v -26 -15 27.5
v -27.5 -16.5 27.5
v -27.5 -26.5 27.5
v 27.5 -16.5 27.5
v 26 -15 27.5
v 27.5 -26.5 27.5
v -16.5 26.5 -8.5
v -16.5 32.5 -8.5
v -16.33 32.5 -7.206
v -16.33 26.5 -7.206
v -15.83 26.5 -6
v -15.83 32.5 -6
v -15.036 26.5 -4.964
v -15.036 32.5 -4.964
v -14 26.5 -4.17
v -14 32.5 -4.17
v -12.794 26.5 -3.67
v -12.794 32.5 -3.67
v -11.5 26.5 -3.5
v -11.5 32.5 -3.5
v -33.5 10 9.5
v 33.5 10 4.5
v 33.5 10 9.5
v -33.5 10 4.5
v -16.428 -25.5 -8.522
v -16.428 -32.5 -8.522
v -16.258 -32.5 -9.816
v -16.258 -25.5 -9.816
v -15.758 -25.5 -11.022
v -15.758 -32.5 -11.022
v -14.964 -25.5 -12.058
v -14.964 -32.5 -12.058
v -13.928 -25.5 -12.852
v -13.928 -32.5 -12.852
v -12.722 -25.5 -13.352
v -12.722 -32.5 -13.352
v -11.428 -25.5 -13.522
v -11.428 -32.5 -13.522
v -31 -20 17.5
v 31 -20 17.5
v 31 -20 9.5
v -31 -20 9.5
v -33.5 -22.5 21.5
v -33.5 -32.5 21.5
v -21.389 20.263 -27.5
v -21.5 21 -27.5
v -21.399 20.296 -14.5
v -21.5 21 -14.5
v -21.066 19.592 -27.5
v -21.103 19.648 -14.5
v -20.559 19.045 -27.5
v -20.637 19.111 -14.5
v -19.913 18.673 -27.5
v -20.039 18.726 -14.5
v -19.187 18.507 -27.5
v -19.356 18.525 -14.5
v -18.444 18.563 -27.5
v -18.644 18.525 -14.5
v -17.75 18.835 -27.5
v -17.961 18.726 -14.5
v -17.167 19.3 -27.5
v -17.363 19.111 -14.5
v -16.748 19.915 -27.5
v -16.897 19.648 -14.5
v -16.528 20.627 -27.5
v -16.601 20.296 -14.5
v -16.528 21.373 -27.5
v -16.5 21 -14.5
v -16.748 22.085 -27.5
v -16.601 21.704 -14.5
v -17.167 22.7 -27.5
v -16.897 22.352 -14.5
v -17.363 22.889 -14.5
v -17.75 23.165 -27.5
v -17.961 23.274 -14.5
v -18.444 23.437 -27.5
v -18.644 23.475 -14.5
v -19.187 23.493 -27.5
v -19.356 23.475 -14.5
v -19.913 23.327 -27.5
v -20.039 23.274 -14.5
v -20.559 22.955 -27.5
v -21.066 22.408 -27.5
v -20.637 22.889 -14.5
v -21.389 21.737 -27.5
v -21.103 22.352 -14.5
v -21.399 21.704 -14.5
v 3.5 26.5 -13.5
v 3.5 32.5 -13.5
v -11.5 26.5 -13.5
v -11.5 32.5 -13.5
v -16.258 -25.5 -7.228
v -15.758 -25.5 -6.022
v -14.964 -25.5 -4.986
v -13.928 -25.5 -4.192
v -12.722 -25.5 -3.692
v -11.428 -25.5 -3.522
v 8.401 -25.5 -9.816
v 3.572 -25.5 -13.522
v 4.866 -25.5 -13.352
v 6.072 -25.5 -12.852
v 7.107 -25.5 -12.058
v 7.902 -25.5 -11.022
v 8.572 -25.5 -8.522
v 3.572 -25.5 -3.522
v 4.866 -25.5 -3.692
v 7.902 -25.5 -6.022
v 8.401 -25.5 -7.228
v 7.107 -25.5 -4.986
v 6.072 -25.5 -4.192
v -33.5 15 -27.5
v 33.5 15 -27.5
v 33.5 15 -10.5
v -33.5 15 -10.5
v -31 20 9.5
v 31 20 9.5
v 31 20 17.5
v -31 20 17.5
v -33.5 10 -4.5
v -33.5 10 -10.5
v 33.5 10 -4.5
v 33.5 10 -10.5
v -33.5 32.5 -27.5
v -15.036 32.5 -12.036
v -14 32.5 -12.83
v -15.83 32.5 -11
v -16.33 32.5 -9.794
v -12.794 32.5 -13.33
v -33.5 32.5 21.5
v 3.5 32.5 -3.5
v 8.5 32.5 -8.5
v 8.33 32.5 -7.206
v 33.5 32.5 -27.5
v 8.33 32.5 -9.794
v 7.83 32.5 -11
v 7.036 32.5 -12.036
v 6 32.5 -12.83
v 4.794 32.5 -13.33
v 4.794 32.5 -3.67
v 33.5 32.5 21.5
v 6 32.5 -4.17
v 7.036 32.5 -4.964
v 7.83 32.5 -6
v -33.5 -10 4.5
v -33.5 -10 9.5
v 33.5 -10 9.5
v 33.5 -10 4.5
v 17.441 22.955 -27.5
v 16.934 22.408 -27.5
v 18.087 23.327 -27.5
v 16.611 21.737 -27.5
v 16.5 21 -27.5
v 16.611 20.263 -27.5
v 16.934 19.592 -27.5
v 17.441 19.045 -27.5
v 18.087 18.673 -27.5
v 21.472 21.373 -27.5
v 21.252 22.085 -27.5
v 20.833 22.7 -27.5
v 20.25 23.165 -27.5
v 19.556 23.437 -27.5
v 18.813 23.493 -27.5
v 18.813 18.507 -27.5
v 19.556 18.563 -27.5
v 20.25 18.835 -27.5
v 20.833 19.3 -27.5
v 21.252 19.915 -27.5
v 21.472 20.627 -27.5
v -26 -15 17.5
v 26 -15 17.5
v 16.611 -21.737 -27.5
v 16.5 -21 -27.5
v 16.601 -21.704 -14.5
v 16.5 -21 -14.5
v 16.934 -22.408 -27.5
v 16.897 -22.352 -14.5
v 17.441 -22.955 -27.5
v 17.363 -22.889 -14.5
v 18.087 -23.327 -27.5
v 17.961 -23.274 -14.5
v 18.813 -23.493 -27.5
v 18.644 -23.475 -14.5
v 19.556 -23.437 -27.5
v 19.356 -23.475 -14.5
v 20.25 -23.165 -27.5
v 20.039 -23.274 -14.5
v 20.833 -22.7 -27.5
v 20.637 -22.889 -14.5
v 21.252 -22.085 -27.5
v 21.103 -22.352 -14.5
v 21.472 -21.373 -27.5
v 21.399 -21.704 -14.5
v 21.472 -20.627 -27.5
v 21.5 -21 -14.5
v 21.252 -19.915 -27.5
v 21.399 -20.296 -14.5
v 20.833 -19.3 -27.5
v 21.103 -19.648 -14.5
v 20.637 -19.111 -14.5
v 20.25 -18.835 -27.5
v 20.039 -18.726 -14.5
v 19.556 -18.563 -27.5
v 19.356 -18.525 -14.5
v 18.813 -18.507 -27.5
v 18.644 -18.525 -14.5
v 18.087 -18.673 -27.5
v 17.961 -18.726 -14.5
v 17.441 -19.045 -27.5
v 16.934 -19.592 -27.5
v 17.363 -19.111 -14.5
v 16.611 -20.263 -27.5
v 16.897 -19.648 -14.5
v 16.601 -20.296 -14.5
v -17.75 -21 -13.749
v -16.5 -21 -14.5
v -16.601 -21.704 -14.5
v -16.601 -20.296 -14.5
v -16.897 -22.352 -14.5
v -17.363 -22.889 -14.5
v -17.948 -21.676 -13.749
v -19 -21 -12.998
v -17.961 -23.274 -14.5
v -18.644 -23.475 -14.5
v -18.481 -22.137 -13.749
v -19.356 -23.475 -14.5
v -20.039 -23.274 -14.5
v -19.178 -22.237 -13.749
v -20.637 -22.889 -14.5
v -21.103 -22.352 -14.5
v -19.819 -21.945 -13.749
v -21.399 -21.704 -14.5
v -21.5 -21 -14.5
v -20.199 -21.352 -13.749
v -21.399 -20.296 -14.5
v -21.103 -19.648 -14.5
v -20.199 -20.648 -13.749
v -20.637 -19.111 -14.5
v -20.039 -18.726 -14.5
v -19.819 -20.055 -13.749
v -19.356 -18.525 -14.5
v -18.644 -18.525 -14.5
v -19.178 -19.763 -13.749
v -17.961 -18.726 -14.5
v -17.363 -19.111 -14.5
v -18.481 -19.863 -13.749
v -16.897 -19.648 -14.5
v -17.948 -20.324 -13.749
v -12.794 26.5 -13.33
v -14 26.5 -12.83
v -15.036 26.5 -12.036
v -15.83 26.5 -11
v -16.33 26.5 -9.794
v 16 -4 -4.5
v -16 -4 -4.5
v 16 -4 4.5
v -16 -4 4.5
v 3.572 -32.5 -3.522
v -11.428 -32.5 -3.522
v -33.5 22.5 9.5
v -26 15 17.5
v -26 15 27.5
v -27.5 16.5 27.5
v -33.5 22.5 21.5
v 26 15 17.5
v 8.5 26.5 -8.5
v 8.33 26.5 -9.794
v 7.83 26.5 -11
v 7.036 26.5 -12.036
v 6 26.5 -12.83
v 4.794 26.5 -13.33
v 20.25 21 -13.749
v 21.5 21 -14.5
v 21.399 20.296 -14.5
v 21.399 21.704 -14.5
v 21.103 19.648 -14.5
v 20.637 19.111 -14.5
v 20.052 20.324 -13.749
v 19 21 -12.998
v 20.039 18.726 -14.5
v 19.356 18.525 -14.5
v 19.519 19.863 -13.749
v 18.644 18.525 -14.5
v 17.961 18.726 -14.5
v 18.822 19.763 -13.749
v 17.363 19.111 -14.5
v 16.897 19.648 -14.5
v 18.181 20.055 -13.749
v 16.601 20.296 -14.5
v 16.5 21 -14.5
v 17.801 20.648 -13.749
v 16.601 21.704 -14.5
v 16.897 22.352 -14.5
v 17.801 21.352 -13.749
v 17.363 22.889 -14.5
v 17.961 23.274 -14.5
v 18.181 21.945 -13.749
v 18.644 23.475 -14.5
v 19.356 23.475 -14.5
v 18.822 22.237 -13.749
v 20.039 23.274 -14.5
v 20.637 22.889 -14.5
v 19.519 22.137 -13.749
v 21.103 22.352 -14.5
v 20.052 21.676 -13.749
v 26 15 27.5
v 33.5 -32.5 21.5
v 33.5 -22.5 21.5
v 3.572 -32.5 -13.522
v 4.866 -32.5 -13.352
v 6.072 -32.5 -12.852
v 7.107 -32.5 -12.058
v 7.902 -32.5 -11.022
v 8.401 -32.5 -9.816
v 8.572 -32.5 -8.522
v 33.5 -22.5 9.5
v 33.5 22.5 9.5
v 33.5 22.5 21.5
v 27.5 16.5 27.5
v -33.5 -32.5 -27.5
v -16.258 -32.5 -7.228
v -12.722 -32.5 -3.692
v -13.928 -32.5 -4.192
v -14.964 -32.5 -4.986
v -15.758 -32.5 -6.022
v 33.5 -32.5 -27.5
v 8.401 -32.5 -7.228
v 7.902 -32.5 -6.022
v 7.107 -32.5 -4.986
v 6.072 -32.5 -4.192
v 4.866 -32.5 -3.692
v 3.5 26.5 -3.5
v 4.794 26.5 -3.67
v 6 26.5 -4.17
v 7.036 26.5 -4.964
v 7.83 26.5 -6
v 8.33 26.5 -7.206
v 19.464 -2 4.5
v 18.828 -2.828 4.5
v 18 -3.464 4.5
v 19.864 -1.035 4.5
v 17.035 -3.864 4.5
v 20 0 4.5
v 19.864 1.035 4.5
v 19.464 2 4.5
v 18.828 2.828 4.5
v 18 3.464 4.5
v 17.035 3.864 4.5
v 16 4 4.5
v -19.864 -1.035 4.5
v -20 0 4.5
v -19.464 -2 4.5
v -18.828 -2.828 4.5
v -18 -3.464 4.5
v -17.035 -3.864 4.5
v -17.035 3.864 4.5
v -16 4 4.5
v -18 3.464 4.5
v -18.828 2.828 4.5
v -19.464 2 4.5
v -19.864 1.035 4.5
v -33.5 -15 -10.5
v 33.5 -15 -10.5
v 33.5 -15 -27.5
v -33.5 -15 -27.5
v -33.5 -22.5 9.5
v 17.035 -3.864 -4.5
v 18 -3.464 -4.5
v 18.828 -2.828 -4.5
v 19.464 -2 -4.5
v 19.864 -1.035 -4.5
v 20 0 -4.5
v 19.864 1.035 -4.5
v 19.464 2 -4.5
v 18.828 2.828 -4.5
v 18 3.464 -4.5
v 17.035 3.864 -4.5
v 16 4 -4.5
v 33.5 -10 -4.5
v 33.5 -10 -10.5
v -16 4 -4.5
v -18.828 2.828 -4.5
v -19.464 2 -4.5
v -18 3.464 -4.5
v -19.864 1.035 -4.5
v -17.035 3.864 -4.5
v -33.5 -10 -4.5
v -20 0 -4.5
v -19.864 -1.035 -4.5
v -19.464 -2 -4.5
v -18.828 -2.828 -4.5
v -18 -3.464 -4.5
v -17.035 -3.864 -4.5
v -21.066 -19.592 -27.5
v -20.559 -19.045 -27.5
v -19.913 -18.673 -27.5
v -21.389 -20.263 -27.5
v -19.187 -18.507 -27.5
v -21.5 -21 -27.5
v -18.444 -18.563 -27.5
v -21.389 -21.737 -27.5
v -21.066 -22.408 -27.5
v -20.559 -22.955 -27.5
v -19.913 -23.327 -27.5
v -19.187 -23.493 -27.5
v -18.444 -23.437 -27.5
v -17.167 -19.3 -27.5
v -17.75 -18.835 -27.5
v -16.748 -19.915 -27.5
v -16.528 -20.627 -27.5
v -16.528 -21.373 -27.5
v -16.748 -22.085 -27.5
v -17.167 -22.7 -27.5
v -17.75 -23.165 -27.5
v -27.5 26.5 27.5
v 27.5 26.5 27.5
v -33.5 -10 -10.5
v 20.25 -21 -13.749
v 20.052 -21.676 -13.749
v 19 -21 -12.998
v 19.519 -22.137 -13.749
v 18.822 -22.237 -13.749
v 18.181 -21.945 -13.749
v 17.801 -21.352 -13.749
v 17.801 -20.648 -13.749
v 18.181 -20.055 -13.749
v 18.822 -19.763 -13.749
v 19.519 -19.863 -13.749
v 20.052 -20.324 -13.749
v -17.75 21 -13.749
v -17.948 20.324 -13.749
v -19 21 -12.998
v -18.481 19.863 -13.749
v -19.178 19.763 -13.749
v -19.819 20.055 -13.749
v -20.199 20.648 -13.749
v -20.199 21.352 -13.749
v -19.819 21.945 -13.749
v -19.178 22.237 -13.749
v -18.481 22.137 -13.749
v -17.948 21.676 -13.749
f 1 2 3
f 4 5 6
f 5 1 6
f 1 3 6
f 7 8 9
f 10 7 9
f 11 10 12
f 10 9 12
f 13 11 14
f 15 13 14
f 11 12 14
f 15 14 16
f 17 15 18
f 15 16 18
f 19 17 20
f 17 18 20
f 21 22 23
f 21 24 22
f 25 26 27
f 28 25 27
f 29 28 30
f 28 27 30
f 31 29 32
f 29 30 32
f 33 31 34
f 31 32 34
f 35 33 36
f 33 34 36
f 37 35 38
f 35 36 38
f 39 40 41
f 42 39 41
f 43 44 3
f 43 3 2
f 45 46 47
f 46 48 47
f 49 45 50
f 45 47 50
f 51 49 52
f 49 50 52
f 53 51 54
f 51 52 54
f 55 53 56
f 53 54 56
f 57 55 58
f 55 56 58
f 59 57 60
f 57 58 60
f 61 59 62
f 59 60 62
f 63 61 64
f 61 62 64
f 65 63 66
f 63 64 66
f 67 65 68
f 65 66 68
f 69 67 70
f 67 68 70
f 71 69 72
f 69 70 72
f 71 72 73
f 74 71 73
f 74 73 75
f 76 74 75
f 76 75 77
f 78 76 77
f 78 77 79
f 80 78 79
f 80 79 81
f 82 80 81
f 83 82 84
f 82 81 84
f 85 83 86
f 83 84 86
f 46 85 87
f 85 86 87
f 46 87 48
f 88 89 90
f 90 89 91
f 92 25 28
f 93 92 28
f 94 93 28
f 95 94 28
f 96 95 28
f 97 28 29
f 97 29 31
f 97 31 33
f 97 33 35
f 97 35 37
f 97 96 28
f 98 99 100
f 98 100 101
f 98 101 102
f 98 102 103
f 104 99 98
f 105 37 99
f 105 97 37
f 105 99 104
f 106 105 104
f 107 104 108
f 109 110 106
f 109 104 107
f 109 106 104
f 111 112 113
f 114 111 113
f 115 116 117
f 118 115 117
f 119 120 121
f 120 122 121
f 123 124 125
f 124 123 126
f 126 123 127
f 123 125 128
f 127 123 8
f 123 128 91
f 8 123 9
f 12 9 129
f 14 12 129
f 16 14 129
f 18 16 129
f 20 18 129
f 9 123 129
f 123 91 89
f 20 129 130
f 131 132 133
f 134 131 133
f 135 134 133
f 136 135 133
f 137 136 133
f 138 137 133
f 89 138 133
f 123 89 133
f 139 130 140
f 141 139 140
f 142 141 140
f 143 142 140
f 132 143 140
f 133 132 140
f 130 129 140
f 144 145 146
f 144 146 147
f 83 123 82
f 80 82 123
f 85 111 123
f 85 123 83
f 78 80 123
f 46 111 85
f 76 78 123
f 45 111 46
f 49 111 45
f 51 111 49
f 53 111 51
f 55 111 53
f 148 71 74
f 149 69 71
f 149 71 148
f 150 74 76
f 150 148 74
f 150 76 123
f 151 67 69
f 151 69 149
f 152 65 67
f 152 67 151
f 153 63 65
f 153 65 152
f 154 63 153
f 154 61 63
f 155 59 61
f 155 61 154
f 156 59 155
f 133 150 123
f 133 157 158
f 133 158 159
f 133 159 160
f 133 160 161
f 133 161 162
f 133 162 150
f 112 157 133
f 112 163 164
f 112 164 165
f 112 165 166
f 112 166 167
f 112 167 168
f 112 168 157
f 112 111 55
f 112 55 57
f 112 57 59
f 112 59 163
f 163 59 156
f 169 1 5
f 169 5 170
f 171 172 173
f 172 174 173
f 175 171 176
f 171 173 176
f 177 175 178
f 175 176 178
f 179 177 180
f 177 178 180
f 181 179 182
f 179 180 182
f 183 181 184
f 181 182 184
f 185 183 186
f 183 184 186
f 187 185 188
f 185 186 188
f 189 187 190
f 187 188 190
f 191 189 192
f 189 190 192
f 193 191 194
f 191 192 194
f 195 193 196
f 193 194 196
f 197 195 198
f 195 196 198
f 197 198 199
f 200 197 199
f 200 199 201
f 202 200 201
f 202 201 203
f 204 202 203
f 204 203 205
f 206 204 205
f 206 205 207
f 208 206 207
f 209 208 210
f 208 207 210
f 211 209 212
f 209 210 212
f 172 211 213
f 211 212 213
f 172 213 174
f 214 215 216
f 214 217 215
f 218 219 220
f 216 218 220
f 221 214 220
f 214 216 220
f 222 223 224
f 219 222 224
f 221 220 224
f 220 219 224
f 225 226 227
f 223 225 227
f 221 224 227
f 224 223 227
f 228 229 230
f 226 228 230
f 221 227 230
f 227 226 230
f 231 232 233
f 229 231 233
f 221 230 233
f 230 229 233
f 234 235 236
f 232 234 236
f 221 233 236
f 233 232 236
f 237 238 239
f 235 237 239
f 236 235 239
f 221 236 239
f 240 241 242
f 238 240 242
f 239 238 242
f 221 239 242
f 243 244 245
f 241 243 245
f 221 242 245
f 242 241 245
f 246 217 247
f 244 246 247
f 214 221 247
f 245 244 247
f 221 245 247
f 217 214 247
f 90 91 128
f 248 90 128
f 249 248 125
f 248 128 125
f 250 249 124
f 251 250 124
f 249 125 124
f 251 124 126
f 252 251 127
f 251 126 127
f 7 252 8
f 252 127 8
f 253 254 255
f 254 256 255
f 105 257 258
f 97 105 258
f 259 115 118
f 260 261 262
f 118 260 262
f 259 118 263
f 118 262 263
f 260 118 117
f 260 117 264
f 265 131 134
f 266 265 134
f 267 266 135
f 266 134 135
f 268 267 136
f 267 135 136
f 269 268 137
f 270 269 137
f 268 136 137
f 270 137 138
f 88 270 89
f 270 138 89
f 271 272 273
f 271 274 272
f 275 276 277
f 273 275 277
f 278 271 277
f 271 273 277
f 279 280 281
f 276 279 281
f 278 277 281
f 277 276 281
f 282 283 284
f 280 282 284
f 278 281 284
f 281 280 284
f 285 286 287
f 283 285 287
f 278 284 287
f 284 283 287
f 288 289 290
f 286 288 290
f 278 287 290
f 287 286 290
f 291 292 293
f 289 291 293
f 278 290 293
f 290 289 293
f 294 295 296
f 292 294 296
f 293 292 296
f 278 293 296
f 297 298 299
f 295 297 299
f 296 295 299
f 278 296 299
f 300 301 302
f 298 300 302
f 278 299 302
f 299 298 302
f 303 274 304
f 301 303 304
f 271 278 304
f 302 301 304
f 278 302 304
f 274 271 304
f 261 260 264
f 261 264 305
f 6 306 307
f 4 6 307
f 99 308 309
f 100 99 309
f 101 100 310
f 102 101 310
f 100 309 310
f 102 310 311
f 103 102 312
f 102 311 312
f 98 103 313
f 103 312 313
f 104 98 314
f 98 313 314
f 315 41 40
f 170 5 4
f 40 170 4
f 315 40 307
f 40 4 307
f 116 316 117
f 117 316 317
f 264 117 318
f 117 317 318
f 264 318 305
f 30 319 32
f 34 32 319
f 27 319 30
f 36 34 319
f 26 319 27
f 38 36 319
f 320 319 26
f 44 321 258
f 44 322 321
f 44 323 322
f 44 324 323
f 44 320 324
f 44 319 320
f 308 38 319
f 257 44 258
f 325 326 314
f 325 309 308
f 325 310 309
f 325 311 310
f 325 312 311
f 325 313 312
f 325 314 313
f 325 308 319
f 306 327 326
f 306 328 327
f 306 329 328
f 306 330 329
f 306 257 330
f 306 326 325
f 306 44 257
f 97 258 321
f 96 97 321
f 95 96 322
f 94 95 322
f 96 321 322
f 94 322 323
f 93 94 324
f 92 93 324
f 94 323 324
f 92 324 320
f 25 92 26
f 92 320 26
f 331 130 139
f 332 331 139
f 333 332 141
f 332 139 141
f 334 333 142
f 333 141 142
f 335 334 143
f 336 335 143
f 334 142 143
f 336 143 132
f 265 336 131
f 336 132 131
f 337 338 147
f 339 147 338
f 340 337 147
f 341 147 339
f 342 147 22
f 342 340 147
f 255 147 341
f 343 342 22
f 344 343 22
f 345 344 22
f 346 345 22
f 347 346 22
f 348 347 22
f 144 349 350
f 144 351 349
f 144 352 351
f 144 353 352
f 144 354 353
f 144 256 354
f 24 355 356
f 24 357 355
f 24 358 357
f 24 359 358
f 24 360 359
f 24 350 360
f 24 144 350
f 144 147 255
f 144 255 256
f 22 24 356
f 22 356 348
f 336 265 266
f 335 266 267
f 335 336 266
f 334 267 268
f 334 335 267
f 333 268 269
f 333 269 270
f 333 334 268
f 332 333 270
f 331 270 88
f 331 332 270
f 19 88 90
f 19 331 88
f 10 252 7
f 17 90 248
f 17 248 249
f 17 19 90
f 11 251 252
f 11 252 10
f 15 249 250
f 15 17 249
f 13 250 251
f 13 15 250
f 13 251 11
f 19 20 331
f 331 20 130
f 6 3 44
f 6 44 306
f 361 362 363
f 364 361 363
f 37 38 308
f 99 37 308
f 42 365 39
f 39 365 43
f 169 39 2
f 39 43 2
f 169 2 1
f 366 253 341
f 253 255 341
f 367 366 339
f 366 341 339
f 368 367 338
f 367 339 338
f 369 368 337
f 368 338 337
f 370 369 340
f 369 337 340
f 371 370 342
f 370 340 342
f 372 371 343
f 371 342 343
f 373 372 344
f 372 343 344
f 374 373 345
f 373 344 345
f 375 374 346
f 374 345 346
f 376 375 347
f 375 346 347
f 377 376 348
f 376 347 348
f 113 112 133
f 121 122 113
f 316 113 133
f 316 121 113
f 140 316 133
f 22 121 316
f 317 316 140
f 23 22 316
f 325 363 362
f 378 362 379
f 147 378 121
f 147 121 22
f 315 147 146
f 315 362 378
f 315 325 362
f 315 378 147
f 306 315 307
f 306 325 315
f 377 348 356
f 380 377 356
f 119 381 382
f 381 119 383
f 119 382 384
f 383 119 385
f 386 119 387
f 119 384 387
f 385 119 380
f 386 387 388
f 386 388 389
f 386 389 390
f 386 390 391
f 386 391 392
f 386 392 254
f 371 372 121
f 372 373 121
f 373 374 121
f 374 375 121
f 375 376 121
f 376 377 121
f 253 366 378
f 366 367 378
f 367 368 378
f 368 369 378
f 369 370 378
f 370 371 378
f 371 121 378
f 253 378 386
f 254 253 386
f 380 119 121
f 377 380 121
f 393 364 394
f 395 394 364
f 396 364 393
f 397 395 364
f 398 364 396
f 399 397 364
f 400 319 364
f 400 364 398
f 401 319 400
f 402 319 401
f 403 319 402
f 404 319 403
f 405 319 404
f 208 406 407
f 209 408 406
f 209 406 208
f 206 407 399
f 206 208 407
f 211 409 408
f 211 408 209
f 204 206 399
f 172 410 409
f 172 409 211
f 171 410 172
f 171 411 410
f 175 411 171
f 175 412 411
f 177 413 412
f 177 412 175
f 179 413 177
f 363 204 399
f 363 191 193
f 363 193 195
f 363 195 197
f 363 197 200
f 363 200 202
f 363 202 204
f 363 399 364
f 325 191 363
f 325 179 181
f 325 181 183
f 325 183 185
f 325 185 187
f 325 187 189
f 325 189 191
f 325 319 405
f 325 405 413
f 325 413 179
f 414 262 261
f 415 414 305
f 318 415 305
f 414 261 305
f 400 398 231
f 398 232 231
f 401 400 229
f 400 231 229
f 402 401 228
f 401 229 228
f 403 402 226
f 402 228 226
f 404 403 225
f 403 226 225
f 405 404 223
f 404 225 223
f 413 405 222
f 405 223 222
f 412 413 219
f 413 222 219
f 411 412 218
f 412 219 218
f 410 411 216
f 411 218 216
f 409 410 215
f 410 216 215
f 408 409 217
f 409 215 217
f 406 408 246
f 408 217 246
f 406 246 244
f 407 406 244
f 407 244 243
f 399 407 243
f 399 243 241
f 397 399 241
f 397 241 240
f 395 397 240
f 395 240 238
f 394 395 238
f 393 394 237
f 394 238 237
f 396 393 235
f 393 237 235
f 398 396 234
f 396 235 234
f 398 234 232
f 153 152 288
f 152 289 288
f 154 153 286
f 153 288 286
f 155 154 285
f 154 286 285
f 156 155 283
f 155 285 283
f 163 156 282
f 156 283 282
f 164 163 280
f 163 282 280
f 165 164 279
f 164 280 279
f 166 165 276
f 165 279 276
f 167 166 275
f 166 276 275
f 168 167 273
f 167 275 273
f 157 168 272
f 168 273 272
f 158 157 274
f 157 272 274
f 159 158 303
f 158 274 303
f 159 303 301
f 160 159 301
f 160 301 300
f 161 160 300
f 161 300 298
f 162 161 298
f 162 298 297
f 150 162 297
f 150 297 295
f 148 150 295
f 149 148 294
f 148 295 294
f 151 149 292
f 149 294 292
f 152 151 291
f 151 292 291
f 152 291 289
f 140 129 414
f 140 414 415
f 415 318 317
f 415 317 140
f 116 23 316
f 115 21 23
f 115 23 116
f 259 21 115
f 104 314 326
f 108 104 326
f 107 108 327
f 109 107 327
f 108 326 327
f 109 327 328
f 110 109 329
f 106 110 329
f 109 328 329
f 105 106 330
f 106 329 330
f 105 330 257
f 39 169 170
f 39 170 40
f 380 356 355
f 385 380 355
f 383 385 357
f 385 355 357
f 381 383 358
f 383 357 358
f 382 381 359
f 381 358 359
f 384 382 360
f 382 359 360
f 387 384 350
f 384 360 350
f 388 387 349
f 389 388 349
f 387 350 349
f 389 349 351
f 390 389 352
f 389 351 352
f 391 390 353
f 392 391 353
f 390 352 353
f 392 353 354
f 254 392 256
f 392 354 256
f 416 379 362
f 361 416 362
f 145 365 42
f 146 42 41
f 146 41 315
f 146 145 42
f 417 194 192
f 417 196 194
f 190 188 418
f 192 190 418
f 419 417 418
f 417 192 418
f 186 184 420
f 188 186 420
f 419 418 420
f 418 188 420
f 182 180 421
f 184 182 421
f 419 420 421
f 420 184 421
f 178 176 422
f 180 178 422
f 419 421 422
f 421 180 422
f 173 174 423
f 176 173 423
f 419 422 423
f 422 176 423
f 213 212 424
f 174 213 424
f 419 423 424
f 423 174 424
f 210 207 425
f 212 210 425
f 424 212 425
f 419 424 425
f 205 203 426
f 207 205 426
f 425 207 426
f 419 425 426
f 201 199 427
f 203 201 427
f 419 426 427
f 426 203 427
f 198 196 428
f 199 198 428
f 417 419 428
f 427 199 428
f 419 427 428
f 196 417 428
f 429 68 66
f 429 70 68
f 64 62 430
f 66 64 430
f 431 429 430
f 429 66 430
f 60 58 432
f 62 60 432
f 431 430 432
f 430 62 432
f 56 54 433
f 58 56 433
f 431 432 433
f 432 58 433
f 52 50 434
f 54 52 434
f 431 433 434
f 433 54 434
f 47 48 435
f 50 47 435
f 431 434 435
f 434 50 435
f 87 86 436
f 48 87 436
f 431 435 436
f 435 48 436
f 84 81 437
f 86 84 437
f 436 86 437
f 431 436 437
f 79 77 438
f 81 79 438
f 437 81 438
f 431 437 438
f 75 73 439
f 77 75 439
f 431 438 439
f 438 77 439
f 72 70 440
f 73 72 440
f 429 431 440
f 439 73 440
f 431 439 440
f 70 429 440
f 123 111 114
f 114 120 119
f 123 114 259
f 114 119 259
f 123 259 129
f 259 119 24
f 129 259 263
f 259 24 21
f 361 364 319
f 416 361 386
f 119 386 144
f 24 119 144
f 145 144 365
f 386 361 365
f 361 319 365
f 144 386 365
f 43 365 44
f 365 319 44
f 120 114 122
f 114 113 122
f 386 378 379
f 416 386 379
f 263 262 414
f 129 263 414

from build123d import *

# Parameters (mm, degrees)
F0_W      = 67
F0_H      = 55
F1_DEPTH  = 32.5
F3_DEPTH  = 33.5
F5_DEPTH  = 4.5
F8_DEPTH  = 6
F9_DEPTH  = 7
F11_D     = 5
F11_DEPTH = 13
F11_TIP   = 1.5021515476
F13_DEPTH = 18
F14_SIZE  = 6


with BuildPart() as f1:
    # F0 (on Front) → F1 (new body, symmetric)
    with BuildSketch(Plane.XZ):
        Rectangle(F0_W, F0_H)
    extrude(amount=F1_DEPTH, both=True)

    # F2 (on Right) → F3 (cut, symmetric)
    with BuildSketch(Plane.YZ):
        Polygon((-10, 4.5), (0, 4.5), (0, 27.5), (-15, 27.5), (-15, 17.5), (-20, 17.5), (-20, 9.5), (-10, 9.5), align=None)
        Polygon((0, 27.5), (0, 4.5), (10, 4.5), (10, 9.5), (20, 9.5), (20, 17.5), (15, 17.5), (15, 27.5), align=None)
        Polygon((10, -4.5), (0, -4.5), (0, -27.5), (15, -27.5), (15, -10.5), (10, -10.5), align=None)
        Polygon((0, -27.5), (0, -4.5), (-10, -4.5), (-10, -10.5), (-15, -10.5), (-15, -27.5), align=None)
    extrude(amount=F3_DEPTH, both=True, mode=Mode.SUBTRACT)

    # F4 (on Top) → F5 (cut, symmetric)
    with BuildSketch(Plane.XY):
        with BuildLine():
            ThreePointArc((20, 0), (18.8284271247, 2.8284271247), (16, 4))
            Line((16, 4), (-16, 4))
            ThreePointArc((-16, 4), (-18.8284271247, 2.8284271247), (-20, 0))
            ThreePointArc((-20, 0), (-18.8284271247, -2.8284271247), (-16, -4))
            Line((-16, -4), (16, -4))
            ThreePointArc((16, -4), (18.8284271247, -2.8284271247), (20, 0))
        make_face()
    extrude(amount=F5_DEPTH, both=True, mode=Mode.SUBTRACT)

    # F7 (on face) → F8 (cut)
    with BuildSketch(Plane(origin=(0, 32.5, 0), x_dir=(-1, 0, 0), z_dir=(0, 1, 0))):
        with BuildLine():
            Line((0, -3.5), (-3.5, -3.5))
            ThreePointArc((-3.5, -3.5), (-7.0355339059, -4.9644660941), (-8.5, -8.5))
            ThreePointArc((-8.5, -8.5), (-7.0355339059, -12.0355339059), (-3.5, -13.5))
            Line((-3.5, -13.5), (11.5, -13.5))
            ThreePointArc((11.5, -13.5), (15.0355339059, -12.0355339059), (16.5, -8.5))
            ThreePointArc((16.5, -8.5), (15.0355339059, -4.9644660941), (11.5, -3.5))
            Line((11.5, -3.5), (0, -3.5))
        make_face()
    extrude(amount=-F8_DEPTH, mode=Mode.SUBTRACT)

    # F6 (on face) → F9 (cut)
    with BuildSketch(Plane.XZ.offset(32.5)):
        with BuildLine():
            Line((0, -3.5220243782), (-11.4281616919, -3.5220243782))
            ThreePointArc((-11.4281616919, -3.5220243782), (-14.9636955978, -4.9864904722), (-16.4281616919, -8.5220243782))
            ThreePointArc((-16.4281616919, -8.5220243782), (-14.9636955978, -12.0575582841), (-11.4281616919, -13.5220243782))
            Line((-11.4281616919, -13.5220243782), (3.5718383081, -13.5220243782))
            ThreePointArc((3.5718383081, -13.5220243782), (7.1073722141, -12.0575582841), (8.5718383081, -8.5220243782))
            ThreePointArc((8.5718383081, -8.5220243782), (7.1073722141, -4.9864904722), (3.5718383081, -3.5220243782))
            Line((3.5718383081, -3.5220243782), (0, -3.5220243782))
        make_face()
    extrude(amount=-F9_DEPTH, mode=Mode.SUBTRACT)

    # F11
    with Locations(Plane(origin=(0, 0, -27.5), x_dir=(1, 0, 0), z_dir=(0, 0, -1))):
        with Locations((-19, -21), (-19, 21), (19, 21), (19, -21)):
            Hole(F11_D / 2, depth=F11_DEPTH)
            with Locations((0, 0, -(F11_DEPTH + F11_TIP / 2))):  # 118° drill point
                Cone(0, F11_D / 2, F11_TIP, mode=Mode.SUBTRACT)

    # F12 (on face) → F13 (cut)
    with BuildSketch(Plane.XY.offset(27.5)):
        Polygon((-33.5, 15), (-26, 15), (-33.5, 22.5), align=None)
        Polygon((33.5, 22.5), (26, 15), (33.5, 15), align=None)
        Polygon((26, -15), (33.5, -22.5), (33.5, -15), align=None)
        Polygon((-33.5, -15), (-33.5, -22.5), (-26, -15), align=None)
    extrude(amount=-F13_DEPTH, mode=Mode.SUBTRACT)

    # F14
    f14_edges = [f1.edges().sort_by_distance(p)[0] for p in [
        (33.5, -27.5, 27.5),
        (0, -32.5, 27.5),
        (-33.5, -27.5, 27.5),
        (33.5, 27.5, 27.5),
        (0, 32.5, 27.5),
        (-33.5, 27.5, 27.5),
    ]]
    chamfer(f14_edges, length=F14_SIZE)


solid = f1.part
